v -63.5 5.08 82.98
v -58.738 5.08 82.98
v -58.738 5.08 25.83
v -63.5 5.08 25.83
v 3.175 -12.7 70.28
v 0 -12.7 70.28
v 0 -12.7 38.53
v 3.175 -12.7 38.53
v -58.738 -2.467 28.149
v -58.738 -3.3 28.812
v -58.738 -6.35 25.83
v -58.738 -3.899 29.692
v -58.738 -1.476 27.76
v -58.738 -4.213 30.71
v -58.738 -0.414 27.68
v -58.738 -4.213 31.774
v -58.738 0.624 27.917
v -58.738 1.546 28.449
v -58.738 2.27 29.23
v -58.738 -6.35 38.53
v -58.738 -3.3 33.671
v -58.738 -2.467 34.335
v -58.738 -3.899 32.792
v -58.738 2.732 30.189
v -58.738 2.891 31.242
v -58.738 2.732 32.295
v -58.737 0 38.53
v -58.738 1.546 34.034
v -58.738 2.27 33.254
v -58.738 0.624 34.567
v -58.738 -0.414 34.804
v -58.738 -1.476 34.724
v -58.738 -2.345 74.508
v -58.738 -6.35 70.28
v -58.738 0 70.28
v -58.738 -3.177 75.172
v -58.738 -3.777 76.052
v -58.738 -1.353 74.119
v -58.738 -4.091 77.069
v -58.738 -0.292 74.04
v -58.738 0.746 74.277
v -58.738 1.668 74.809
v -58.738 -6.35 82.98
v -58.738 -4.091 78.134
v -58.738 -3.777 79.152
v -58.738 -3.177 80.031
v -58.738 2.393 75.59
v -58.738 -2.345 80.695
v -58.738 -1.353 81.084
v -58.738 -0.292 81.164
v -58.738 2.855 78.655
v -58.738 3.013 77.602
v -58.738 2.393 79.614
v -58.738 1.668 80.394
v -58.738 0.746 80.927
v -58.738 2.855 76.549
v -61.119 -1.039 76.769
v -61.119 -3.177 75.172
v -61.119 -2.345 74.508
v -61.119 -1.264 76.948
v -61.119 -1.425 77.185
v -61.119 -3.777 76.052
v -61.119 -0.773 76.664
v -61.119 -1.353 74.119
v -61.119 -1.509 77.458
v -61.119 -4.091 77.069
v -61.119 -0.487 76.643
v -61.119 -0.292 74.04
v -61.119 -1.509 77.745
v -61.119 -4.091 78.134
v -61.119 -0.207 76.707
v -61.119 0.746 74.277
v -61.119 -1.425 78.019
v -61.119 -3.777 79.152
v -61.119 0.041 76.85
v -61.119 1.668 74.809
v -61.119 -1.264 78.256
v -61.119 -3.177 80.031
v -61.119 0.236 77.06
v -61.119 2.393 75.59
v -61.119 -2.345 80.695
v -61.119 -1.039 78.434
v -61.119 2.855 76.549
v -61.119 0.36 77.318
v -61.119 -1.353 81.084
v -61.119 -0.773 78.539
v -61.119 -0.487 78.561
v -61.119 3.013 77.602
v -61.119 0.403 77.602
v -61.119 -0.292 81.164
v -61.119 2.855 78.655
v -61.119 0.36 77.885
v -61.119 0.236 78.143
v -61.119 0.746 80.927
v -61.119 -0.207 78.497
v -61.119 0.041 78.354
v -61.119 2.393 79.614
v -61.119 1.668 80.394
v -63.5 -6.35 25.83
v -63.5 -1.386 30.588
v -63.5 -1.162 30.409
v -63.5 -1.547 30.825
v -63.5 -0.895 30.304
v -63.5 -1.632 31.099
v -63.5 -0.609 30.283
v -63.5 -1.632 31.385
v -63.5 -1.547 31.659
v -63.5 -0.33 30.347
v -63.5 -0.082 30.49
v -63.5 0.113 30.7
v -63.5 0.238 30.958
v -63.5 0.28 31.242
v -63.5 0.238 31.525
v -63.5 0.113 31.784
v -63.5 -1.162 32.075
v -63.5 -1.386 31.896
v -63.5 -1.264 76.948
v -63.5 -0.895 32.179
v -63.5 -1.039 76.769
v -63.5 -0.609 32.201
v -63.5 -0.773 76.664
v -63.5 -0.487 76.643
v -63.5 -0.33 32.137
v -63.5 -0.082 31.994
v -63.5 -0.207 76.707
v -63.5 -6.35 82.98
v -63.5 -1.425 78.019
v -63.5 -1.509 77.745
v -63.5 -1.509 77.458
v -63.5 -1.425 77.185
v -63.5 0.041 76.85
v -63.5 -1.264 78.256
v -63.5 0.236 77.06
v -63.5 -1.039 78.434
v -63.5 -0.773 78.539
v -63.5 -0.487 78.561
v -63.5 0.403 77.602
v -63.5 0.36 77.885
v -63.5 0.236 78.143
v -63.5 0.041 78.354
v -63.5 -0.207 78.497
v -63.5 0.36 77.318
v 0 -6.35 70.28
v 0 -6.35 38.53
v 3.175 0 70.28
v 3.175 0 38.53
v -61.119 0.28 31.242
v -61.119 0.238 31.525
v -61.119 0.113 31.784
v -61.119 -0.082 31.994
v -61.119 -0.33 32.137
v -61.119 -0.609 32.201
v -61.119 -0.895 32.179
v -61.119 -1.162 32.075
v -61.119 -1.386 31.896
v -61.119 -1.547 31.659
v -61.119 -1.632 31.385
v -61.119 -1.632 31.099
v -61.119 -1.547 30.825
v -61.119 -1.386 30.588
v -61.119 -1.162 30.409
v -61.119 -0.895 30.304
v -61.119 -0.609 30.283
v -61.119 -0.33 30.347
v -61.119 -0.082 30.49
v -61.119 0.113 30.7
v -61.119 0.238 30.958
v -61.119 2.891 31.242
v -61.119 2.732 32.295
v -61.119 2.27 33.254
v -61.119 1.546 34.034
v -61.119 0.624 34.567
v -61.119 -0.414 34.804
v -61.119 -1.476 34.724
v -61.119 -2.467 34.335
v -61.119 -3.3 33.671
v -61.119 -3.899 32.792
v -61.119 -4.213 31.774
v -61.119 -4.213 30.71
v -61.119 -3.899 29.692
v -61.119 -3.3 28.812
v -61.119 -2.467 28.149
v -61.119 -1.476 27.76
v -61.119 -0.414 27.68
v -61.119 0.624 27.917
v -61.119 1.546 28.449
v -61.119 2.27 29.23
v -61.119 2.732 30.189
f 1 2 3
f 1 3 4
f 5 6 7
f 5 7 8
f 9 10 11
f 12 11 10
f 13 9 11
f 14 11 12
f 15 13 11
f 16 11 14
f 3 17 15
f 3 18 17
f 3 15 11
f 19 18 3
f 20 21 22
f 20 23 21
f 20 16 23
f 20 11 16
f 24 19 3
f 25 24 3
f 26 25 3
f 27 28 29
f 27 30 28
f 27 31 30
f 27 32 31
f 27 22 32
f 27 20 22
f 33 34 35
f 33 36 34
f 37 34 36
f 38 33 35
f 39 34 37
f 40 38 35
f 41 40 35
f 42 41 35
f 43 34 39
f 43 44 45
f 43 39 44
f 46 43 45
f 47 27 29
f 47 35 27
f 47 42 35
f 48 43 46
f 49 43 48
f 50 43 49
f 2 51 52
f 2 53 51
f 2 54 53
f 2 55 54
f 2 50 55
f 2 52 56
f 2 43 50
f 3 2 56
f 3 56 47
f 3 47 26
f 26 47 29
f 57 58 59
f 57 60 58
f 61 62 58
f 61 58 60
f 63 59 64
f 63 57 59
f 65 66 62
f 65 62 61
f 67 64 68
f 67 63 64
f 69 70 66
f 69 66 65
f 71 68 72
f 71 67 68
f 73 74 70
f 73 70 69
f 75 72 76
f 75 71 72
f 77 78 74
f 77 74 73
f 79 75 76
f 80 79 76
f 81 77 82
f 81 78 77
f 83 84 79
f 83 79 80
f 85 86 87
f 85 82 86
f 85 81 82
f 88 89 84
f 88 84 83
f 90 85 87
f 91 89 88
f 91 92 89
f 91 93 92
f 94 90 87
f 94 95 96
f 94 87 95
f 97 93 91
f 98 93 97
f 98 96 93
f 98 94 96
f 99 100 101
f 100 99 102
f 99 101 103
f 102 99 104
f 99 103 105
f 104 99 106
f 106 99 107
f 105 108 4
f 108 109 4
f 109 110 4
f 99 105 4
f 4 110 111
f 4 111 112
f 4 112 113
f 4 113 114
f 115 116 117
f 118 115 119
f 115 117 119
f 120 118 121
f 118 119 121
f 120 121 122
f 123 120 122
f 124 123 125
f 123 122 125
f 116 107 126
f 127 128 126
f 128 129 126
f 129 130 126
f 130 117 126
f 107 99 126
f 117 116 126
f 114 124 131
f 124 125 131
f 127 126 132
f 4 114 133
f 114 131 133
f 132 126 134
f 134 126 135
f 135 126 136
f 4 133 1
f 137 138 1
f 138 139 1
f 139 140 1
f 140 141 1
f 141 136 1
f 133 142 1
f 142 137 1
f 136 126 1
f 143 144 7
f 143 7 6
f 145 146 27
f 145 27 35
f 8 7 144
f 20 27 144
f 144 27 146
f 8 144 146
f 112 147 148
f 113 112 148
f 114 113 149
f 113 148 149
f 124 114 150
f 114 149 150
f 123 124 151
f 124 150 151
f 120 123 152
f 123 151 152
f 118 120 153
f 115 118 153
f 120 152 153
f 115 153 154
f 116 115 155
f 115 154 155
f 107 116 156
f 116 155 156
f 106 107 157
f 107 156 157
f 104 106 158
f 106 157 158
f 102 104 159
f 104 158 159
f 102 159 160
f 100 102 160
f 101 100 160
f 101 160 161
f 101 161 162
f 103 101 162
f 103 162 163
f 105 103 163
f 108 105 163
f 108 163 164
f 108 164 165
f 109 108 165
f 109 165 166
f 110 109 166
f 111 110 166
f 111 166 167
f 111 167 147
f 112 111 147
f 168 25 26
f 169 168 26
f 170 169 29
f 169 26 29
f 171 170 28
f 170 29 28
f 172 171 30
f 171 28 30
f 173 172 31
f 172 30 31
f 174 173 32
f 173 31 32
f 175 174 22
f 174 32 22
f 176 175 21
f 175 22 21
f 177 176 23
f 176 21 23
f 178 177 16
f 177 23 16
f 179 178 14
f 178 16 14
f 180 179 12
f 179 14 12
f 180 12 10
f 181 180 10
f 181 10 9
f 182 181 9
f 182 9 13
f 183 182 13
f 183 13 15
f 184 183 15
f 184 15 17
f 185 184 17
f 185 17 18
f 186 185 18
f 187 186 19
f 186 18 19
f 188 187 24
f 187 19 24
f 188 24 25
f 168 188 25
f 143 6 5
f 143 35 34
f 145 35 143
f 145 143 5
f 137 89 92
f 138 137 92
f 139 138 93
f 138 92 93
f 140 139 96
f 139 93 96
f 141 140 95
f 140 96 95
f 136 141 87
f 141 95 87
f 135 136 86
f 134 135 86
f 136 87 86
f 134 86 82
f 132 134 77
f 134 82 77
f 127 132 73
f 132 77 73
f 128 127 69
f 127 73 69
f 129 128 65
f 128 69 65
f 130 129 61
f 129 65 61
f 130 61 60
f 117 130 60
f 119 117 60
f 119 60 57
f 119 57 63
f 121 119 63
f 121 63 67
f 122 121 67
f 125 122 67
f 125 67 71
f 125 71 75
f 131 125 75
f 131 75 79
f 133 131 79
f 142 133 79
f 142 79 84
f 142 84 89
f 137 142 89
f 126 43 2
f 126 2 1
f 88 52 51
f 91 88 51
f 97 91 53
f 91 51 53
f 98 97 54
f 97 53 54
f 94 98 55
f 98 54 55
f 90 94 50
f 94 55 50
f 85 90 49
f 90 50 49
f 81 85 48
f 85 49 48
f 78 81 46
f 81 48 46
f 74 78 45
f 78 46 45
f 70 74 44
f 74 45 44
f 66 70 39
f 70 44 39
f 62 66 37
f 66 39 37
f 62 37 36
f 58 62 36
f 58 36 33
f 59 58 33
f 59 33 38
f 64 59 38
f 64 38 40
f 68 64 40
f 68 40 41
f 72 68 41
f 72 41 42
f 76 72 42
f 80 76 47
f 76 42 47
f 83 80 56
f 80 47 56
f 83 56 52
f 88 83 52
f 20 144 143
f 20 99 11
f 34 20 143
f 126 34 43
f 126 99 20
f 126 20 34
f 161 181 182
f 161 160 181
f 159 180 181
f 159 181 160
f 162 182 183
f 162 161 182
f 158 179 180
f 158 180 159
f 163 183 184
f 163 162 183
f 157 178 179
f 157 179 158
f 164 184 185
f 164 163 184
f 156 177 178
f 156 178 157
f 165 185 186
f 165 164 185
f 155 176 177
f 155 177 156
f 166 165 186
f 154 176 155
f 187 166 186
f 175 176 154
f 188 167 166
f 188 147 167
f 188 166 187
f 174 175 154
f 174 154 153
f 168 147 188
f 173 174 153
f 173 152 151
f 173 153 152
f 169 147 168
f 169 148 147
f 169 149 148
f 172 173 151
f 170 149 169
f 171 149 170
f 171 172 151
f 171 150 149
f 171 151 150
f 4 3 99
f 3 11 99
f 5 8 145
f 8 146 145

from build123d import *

# Parameters (mm, degrees)
F0_W      = 63.5
F0_H      = 31.75
F1_DEPTH  = 6.35
F2_W      = 4.7625
F2_H      = 6.35
F3_DEPTH  = 12.7
F4_W      = 4.7625
F4_H      = 6.35
F5_DEPTH  = 12.7
F6_W      = 4.7625
F6_H      = 12.7
F7_DEPTH  = 5.08
F8_R      = 3.571875
F8_R_2    = 0.9615286486
F9_DEPTH  = 2.38125
F10_DEPTH = 6.35
F11_W     = 4.7625
F11_H     = 12.7
F12_DEPTH = 5.08
F13_R     = 0.9615297
F14_DEPTH = 6.35
F13_R_2   = 3.571875
F15_DEPTH = 2.38125
F16_DEPTH = 31.75
F17_DEPTH = 3.175
F18_W     = 3.175
F18_H     = 31.75
F19_DEPTH = 6.35


with BuildPart() as f1:
    # F0 (on Front) → F1 (new body)
    with BuildSketch(Plane.XZ):
        with Locations((-31.75, 54.4051597416)):
            Rectangle(F0_W, F0_H)
    extrude(amount=F1_DEPTH)

    # F2 (on face) → F3 (join)
    with BuildSketch(Plane.XY.offset(70.2801597416)):
        with Locations((-61.11875, -3.175)):
            Rectangle(F2_W, F2_H)
    extrude(amount=F3_DEPTH)

    # F4 (on face) → F5 (join)
    with BuildSketch(Plane(origin=(0, 0, 38.5301597416), x_dir=(1, 0, 0), z_dir=(0, 0, -1))):
        with Locations((-61.11875, 3.175)):
            Rectangle(F4_W, F4_H)
    extrude(amount=F5_DEPTH)

    # F6 (on face) → F7 (join)
    with BuildSketch(Plane(origin=(0, 0, 0), x_dir=(-1, 0, 0), z_dir=(0, 1, 0))):
        with Locations((61.11875, 76.6301597416)):
            Rectangle(F6_W, F6_H)
    extrude(amount=F7_DEPTH)

    # F8 (on face) → F9 (cut)
    with BuildSketch(Plane.YZ.offset(-58.7375)):
        with Locations((-0.5586565495, 77.6017636912)):
            Circle(F8_R)
        with Locations((-0.5586565495, 77.6017636912)):
            Circle(F8_R_2, mode=Mode.SUBTRACT)
    extrude(amount=-F9_DEPTH, mode=Mode.SUBTRACT)

    # F8 (on face) → F10 (cut)
    with BuildSketch(Plane.YZ.offset(-58.7375)):
        with Locations((-0.5586565495, 77.6017636912)):
            Circle(F8_R_2)
    extrude(amount=-F10_DEPTH, mode=Mode.SUBTRACT)

    # F11 (on face) → F12 (join)
    with BuildSketch(Plane(origin=(0, 0, 0), x_dir=(-1, 0, 0), z_dir=(0, 1, 0))):
        with Locations((61.11875, 32.1801597416)):
            Rectangle(F11_W, F11_H)
    extrude(amount=F12_DEPTH)

    # F13 (on face) → F14 (cut)
    with BuildSketch(Plane.YZ.offset(-58.7375)):
        with Locations((-0.6811455784, 31.2418671489)):
            Circle(F13_R)
    extrude(amount=-F14_DEPTH, mode=Mode.SUBTRACT)

    # F13 (on face) → F15 (cut)
    with BuildSketch(Plane.YZ.offset(-58.7375)):
        with Locations((-0.6811455784, 31.2418671489)):
            Circle(F13_R_2)
        with Locations((-0.6811455784, 31.2418671489)):
            Circle(F13_R, mode=Mode.SUBTRACT)
    extrude(amount=-F15_DEPTH, mode=Mode.SUBTRACT)

    # F16 (add): a face of the model
    f16_faces = [f1.faces().sort_by_distance(p)[0] for p in [
        (-61.11875, 2.54, 70.2801597416),
    ]]
    extrude(f16_faces, amount=F16_DEPTH)

    # F17 (add): a face of the model
    f17_faces = [f1.faces().sort_by_distance(p)[0] for p in [
        (0, -3.175, 54.4051597416),
    ]]
    extrude(f17_faces, amount=F17_DEPTH)

    # F18 (on face) → F19 (join)
    with BuildSketch(Plane.XZ.offset(6.35)):
        with Locations((1.5875, 54.4051597416)):
            Rectangle(F18_W, F18_H)
    extrude(amount=F19_DEPTH)


solid = f1.part
